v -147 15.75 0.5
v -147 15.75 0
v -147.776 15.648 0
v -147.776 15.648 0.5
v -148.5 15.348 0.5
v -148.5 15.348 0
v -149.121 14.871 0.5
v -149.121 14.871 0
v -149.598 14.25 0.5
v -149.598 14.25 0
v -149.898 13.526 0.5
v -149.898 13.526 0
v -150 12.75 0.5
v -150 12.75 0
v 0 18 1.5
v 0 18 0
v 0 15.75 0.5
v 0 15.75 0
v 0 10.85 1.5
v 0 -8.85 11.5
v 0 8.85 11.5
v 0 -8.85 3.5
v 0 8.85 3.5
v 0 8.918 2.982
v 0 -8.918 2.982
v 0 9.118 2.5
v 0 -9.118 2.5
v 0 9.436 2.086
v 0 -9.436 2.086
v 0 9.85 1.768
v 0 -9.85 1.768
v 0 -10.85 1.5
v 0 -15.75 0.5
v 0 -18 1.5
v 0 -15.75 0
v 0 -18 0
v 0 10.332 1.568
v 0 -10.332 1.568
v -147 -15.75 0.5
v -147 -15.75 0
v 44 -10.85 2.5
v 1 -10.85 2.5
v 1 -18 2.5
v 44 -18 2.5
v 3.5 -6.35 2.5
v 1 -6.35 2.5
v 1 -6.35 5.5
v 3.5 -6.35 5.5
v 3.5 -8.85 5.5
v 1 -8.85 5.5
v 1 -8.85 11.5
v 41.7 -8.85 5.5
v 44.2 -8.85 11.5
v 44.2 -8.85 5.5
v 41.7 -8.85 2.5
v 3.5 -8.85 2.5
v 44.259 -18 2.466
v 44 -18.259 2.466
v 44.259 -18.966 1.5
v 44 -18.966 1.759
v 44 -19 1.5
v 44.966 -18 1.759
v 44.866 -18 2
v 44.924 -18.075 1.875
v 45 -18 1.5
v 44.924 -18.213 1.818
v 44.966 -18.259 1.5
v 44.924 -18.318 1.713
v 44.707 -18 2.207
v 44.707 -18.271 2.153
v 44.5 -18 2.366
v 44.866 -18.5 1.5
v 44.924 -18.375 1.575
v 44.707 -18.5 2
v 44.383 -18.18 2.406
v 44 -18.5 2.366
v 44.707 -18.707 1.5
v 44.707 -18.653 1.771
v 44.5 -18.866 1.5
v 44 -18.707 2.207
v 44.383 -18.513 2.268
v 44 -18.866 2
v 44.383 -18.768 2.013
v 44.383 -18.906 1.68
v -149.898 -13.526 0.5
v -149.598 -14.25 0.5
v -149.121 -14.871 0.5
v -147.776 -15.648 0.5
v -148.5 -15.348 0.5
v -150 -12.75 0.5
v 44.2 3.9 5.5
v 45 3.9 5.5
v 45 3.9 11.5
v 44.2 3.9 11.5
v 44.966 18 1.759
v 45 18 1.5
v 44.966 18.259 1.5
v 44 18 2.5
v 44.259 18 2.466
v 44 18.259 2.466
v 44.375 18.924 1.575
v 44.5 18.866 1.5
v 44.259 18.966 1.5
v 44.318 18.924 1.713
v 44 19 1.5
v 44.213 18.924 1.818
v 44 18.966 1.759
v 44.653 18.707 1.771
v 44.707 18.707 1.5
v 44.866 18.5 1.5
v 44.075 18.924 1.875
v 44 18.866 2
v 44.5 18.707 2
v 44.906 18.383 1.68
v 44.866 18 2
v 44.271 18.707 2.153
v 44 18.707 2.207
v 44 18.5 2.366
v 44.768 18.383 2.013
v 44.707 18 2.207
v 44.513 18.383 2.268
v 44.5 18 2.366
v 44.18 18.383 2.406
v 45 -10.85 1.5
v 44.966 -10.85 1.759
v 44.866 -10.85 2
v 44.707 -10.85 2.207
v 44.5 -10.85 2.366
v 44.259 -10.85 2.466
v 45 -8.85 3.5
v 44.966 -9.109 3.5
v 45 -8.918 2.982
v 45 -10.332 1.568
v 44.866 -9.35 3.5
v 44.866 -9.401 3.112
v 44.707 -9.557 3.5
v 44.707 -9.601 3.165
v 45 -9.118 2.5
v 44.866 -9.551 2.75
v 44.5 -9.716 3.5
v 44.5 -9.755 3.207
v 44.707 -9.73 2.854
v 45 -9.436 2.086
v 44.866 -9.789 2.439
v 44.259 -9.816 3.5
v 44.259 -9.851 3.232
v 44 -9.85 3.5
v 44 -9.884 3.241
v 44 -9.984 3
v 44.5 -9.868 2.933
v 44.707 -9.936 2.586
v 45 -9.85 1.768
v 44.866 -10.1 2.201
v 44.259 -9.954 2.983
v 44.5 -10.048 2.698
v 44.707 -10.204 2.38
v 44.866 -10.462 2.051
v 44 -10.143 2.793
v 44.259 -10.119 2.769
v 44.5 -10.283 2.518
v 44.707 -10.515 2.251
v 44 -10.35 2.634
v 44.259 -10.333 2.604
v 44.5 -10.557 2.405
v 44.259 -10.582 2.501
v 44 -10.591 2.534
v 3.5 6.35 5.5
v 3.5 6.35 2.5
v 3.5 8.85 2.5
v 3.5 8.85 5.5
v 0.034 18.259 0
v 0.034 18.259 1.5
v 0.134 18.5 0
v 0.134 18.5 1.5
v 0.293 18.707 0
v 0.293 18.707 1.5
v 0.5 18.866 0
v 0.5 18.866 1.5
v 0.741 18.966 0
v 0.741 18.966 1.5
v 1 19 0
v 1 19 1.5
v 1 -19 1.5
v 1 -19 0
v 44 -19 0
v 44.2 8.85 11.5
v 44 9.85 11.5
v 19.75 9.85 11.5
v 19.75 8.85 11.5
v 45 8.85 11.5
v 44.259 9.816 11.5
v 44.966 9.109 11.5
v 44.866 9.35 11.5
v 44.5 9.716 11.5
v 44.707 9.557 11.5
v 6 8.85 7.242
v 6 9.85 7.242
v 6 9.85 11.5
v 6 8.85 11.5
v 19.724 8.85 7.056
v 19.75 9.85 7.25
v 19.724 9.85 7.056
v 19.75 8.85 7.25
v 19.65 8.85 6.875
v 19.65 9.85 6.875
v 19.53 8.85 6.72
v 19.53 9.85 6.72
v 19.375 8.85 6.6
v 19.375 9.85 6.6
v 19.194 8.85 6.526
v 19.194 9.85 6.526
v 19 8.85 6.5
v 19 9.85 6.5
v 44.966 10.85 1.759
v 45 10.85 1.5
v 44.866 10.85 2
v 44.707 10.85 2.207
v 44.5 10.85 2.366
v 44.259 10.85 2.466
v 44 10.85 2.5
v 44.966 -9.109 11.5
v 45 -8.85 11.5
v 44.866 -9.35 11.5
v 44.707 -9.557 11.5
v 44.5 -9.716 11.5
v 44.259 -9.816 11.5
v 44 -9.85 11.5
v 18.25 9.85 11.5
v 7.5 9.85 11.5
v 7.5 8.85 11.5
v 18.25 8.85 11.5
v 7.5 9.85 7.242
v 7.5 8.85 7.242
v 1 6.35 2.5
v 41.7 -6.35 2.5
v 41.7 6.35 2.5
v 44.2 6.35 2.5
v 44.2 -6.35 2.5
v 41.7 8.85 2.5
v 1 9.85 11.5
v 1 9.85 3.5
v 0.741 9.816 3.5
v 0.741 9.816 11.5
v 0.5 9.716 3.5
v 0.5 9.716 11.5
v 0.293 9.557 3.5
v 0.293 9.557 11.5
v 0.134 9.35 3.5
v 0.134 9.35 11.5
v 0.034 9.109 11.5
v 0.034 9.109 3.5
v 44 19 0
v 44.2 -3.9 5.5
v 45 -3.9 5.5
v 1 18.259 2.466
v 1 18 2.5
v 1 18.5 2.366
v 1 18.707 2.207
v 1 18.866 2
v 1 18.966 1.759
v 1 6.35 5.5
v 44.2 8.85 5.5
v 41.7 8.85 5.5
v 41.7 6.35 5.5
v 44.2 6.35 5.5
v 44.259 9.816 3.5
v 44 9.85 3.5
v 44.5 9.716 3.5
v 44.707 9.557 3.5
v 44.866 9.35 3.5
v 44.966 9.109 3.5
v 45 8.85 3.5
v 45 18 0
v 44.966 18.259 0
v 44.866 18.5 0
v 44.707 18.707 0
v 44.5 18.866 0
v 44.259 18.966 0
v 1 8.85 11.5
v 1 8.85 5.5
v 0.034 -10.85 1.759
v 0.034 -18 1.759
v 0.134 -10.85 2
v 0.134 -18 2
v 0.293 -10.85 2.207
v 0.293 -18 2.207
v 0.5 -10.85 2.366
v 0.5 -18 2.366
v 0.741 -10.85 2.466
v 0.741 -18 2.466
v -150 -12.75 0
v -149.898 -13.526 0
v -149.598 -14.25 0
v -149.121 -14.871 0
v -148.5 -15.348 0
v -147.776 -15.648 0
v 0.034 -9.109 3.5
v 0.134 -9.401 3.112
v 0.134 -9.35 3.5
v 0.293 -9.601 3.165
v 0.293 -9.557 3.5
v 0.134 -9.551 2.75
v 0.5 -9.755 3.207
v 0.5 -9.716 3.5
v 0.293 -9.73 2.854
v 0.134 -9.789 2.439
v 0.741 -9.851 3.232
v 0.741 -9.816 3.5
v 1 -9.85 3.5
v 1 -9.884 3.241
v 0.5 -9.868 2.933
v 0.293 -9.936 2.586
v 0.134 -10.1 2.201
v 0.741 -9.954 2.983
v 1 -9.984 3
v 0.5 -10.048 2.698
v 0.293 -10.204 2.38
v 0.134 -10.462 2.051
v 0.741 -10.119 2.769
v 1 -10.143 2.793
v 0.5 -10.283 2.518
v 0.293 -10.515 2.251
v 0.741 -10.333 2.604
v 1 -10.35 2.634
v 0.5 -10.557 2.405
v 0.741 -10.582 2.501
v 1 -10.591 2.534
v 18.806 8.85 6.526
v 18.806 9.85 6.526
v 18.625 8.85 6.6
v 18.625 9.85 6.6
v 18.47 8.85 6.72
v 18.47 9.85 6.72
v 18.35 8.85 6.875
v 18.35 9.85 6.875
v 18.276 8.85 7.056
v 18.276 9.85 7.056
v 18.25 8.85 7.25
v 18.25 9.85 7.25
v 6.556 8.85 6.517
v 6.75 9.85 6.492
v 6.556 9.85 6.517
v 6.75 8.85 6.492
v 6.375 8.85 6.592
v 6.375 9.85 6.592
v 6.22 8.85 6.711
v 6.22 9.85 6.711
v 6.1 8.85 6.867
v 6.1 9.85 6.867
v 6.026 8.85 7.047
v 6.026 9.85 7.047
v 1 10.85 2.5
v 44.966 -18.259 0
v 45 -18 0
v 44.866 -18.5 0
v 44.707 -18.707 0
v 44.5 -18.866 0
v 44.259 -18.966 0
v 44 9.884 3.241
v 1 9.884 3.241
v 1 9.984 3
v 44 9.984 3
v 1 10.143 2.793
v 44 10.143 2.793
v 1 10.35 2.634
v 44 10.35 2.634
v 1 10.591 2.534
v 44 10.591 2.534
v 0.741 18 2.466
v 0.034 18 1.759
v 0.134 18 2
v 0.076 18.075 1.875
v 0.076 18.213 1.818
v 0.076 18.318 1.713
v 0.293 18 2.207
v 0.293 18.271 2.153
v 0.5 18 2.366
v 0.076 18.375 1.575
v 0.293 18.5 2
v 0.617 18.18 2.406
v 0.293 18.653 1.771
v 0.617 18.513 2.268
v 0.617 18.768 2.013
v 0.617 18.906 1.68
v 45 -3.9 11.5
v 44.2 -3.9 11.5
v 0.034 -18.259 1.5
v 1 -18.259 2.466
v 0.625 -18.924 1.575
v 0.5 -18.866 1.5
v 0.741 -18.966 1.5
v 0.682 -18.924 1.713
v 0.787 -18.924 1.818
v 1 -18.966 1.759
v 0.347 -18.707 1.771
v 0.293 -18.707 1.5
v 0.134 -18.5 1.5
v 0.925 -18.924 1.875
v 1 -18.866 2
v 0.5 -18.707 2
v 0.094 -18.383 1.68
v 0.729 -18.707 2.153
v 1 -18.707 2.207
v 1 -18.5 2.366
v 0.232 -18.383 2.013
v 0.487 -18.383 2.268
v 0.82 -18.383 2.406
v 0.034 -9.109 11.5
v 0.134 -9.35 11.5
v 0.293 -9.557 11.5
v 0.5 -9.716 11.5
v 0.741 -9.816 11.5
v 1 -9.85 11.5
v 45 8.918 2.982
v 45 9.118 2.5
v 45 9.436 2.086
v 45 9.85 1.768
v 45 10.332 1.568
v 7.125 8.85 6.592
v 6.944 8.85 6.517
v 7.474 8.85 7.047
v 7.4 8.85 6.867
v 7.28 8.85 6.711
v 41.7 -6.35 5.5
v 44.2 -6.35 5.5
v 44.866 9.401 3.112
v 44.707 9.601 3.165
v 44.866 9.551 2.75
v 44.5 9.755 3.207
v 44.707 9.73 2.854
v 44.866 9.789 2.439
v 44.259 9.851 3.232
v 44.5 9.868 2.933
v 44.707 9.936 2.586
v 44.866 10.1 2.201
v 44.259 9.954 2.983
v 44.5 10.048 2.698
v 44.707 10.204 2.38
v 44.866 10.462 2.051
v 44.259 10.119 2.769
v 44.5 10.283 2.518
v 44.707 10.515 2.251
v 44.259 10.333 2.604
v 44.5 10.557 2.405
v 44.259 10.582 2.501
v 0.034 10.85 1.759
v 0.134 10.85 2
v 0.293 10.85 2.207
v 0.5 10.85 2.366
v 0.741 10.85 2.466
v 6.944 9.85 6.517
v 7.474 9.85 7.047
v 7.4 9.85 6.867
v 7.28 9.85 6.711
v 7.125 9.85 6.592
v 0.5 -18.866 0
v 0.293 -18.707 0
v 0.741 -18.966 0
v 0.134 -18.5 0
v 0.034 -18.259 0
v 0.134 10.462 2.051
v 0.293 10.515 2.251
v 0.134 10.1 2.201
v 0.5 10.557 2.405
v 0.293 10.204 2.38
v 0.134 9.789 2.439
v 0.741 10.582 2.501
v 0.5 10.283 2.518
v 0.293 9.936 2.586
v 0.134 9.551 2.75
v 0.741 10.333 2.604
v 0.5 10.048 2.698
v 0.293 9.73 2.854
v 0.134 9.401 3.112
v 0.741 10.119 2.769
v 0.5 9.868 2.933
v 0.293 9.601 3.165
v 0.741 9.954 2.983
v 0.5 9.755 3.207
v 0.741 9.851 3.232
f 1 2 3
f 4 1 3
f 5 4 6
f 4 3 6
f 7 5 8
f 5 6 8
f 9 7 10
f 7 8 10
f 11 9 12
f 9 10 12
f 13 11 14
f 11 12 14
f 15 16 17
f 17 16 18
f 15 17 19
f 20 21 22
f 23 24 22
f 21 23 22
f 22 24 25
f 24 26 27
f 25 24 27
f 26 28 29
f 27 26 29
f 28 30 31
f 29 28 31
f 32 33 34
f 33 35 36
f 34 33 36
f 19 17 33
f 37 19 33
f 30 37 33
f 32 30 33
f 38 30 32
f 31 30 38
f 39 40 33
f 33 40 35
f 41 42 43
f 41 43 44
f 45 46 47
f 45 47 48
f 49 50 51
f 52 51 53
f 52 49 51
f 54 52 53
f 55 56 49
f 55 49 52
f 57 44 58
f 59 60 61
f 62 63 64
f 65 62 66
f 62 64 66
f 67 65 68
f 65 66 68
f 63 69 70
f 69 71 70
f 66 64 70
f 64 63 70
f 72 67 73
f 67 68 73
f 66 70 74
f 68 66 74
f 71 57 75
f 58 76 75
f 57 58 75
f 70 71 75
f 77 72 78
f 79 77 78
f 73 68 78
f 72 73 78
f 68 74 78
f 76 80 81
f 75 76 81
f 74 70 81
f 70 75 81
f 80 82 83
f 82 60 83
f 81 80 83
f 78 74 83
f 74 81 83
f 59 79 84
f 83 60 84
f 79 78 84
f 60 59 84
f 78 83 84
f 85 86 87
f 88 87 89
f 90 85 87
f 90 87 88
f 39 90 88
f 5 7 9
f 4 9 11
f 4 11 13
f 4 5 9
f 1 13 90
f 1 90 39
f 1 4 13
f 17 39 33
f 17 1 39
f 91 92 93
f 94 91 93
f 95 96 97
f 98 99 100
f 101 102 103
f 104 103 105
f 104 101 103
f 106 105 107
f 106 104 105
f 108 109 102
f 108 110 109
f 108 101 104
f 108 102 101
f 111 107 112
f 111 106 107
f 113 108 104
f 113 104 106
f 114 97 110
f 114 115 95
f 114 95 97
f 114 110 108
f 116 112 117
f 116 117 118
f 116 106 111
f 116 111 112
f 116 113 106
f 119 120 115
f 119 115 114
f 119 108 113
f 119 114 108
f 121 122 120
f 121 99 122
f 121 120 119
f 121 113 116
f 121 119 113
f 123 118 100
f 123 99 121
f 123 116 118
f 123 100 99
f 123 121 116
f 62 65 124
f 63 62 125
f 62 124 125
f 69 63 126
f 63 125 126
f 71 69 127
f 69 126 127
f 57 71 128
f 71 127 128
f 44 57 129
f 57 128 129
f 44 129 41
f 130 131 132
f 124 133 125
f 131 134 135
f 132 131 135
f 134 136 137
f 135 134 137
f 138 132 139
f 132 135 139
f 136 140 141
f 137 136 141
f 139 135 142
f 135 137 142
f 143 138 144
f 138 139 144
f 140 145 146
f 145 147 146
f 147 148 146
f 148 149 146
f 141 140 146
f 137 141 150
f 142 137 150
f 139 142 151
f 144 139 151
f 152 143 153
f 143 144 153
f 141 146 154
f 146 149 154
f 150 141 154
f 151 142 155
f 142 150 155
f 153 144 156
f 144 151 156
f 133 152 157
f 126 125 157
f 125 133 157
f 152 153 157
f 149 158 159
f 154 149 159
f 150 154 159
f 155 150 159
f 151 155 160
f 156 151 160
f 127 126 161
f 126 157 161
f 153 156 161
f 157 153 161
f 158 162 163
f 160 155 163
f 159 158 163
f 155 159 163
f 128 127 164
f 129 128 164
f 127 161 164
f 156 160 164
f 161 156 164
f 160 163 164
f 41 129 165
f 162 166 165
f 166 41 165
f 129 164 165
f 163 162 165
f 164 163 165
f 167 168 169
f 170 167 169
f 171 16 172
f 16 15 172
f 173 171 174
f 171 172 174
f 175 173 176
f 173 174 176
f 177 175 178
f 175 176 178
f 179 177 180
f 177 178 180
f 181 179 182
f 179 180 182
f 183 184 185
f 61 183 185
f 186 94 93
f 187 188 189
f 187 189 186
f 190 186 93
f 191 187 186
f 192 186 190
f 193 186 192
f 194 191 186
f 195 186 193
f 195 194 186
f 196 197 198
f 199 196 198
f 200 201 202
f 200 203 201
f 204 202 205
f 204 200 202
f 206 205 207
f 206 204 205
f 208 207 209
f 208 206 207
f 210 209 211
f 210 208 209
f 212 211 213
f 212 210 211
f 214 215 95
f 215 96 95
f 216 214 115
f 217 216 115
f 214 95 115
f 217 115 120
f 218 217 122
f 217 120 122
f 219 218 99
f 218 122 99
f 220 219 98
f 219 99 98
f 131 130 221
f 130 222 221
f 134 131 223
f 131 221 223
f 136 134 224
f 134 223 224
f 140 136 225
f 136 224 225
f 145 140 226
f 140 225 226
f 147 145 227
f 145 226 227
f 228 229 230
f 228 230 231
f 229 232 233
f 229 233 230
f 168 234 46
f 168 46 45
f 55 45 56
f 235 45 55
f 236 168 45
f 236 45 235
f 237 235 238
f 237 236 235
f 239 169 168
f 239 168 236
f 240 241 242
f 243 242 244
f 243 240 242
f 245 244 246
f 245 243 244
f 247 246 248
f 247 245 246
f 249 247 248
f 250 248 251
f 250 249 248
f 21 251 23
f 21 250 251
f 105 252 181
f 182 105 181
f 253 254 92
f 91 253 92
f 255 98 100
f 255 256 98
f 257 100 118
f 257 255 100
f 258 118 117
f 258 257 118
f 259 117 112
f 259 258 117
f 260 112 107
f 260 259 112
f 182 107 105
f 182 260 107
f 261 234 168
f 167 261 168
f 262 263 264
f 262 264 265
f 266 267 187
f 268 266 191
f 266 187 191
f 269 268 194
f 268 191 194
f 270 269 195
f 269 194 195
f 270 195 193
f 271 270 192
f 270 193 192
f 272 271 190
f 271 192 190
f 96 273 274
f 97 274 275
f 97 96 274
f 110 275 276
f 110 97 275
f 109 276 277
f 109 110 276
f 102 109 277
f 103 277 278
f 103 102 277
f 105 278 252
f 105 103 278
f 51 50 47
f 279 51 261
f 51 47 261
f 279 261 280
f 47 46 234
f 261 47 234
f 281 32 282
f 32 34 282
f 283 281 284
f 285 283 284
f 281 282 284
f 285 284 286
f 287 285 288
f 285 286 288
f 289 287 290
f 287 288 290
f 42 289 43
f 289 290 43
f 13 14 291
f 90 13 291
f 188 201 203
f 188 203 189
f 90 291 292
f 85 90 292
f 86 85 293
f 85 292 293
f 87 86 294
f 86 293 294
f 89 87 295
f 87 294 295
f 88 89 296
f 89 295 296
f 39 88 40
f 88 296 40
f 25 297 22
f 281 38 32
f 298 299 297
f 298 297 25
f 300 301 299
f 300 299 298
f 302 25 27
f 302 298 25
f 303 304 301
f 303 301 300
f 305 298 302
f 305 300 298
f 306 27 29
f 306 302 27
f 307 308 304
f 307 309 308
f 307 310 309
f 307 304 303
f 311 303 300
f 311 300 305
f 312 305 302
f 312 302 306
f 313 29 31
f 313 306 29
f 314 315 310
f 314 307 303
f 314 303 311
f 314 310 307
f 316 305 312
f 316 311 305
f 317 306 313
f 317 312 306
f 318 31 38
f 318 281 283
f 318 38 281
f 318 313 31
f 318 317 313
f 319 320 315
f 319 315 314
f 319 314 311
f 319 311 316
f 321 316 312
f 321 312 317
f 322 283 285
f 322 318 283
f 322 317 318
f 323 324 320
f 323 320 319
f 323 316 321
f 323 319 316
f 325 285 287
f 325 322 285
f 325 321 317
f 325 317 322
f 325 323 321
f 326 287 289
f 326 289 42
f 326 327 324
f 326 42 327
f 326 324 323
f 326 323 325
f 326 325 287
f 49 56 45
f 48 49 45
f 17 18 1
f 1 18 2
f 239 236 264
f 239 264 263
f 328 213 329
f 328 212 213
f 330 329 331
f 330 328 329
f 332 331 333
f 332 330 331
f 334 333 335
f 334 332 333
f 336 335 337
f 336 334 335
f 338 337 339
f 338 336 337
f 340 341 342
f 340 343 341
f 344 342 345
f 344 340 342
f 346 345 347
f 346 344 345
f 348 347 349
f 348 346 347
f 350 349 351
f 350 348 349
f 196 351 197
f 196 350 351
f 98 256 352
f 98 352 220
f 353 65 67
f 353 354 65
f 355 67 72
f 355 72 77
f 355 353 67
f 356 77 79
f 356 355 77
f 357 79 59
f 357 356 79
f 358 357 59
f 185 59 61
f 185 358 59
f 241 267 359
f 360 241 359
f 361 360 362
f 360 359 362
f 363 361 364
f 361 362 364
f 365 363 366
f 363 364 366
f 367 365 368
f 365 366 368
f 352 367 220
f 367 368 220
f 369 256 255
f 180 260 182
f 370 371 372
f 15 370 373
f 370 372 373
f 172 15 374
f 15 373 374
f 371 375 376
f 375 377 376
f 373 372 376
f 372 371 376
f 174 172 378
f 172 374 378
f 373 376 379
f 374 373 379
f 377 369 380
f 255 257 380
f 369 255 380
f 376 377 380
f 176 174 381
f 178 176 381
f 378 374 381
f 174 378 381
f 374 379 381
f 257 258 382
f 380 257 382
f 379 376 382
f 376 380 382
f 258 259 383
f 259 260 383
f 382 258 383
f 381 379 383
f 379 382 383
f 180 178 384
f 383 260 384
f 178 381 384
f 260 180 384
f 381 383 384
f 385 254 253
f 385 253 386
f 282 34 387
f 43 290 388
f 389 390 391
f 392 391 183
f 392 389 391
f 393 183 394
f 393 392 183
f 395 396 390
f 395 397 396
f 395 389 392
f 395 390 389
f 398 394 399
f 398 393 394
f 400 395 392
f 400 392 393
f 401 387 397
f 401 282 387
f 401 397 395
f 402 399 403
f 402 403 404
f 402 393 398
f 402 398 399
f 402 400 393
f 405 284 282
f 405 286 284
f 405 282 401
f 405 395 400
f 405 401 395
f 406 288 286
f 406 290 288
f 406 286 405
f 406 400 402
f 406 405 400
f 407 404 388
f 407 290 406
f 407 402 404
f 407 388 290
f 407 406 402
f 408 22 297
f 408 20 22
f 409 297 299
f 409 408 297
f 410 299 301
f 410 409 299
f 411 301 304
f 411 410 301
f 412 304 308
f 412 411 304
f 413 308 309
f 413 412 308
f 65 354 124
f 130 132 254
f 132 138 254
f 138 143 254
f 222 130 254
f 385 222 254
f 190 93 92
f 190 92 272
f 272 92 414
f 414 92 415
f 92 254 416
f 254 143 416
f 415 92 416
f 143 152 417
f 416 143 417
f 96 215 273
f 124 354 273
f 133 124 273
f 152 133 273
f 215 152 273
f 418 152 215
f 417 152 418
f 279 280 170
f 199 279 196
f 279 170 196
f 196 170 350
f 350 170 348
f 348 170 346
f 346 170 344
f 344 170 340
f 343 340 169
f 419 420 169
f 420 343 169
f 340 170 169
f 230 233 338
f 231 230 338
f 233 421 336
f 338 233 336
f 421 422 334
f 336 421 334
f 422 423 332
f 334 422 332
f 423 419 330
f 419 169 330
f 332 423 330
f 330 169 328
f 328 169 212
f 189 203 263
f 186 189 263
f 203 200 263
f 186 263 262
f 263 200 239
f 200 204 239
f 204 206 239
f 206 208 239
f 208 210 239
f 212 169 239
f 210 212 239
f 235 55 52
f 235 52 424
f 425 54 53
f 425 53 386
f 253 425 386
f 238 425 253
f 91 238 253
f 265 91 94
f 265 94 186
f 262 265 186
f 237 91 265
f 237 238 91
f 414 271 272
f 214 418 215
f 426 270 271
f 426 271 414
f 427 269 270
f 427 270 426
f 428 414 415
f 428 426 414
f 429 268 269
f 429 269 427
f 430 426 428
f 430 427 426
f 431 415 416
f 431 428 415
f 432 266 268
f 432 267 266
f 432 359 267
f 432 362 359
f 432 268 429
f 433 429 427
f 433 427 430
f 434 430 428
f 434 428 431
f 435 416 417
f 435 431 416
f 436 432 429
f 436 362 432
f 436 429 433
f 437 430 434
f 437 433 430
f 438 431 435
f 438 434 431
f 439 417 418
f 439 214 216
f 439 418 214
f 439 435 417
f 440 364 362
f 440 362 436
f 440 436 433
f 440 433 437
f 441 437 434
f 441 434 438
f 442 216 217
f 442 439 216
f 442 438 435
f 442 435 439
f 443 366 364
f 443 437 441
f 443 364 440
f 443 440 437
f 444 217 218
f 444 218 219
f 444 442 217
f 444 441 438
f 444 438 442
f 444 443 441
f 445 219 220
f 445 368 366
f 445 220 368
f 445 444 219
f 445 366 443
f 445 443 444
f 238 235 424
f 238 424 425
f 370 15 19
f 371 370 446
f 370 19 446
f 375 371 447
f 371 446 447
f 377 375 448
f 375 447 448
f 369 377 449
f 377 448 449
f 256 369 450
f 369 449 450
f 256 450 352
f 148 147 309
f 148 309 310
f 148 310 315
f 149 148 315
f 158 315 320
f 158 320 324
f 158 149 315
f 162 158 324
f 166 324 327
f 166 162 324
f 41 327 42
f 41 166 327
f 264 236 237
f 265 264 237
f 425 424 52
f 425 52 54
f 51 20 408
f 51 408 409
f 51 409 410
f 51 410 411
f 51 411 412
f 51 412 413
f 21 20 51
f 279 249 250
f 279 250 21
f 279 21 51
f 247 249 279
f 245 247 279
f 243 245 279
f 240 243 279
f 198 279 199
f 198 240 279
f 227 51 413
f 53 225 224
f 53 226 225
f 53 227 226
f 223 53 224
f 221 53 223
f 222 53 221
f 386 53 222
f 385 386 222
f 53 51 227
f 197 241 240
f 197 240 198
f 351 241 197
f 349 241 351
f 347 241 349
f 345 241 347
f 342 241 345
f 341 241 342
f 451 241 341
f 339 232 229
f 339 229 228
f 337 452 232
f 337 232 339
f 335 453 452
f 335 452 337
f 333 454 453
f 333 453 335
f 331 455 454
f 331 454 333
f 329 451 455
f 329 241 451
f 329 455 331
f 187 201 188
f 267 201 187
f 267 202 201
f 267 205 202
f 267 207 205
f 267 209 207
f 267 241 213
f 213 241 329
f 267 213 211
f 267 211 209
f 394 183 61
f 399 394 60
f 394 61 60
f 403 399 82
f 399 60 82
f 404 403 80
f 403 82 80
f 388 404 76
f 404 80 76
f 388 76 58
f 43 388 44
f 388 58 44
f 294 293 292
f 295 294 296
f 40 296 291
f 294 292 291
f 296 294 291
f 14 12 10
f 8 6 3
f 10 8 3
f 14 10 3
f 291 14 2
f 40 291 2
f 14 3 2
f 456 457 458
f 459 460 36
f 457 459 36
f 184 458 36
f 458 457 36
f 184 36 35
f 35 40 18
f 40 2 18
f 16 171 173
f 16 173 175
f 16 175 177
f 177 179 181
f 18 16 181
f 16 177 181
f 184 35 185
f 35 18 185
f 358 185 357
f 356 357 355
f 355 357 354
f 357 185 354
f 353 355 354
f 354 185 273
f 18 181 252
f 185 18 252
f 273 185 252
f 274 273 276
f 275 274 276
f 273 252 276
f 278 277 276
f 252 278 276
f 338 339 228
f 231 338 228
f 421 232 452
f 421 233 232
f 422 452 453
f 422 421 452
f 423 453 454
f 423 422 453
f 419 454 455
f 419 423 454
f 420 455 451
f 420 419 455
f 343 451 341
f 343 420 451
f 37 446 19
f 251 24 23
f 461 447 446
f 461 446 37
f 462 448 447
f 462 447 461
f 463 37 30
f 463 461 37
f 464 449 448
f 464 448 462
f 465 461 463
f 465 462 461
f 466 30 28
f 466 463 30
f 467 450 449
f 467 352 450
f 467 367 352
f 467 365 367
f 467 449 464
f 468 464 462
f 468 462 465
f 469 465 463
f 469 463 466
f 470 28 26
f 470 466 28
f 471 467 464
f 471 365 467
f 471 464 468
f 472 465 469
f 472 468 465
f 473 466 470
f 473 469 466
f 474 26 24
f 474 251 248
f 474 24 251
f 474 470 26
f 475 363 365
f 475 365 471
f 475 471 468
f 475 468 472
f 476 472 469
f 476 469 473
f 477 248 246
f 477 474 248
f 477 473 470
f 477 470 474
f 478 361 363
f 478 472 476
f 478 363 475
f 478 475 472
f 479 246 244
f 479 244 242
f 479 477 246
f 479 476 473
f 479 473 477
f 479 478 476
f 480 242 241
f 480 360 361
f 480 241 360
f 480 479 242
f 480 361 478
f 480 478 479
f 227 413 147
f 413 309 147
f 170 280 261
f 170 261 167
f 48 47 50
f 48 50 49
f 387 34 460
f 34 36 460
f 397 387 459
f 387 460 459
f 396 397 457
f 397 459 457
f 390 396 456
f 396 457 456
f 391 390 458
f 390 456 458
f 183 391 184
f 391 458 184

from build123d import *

# Parameters (mm, degrees)
F1_DEPTH  = 0.5
F3_DEPTH  = 2
F4_W      = 45
F4_H      = 19.7
F4_W_2    = 43.2
F4_H_2    = 17.7
F5_DEPTH  = 9
F6_W      = 2.5
F6_H      = 2.5
F7_DEPTH  = 3
F8_W      = 7.8
F8_H      = 6
F9_DEPTH  = 0.8
F10_W     = 1.5
F10_H     = 5
F10_H_2   = 5.0084371828
F11_DEPTH = 1
F12_R     = 0.74999
F13_R     = 1


# Not quite as in the source:
# - a fillet or chamfer is up to 0.001 mm smaller than in the source, because OpenCascade refuses the exact size


with BuildPart() as f1:
    # F0 (on Top) → F1 (new body)
    with BuildSketch(Plane.XY):
        with BuildLine():
            Line((0, -15.75), (0, 15.75))
            Line((0, 15.75), (-147, 15.75))
            ThreePointArc((-147, 15.75), (-149.1213203436, 14.8713203436), (-150, 12.75))
            Line((-150, 12.75), (-150, -12.75))
            ThreePointArc((-150, -12.75), (-149.1213203436, -14.8713203436), (-147, -15.75))
            Line((-147, -15.75), (0, -15.75))
        make_face()
        Polygon((45, 19), (0, 19), (0, 15.75), (0, -15.75), (0, -19), (45, -19), align=None)
    extrude(amount=F1_DEPTH)

    # F2 (on face) → F3 (join)
    with BuildSketch(Plane.XY.offset(0.5)):
        Polygon((45, -19), (45, 19), (0, 19), (0, 15.75), (0, -15.75), (0, -19), align=None)
    extrude(amount=F3_DEPTH)

    # F4 (on face) → F5 (join)
    with BuildSketch(Plane.XY.offset(2.5)):
        with Locations((22.5, 0)):
            Rectangle(F4_W, F4_H)
        with Locations((22.6, 0)):
            Rectangle(F4_W_2, F4_H_2, mode=Mode.SUBTRACT)
    extrude(amount=F5_DEPTH)

    # F6 (on face) → F7 (join)
    with BuildSketch(Plane.XY.offset(2.5)):
        with Locations((2.25, 7.6)):
            Rectangle(F6_W, F6_H)
        with Locations((42.95, 7.6)):
            Rectangle(F6_W, F6_H)
        with Locations((42.95, -7.6)):
            Rectangle(F6_W, F6_H)
        with Locations((2.25, -7.6)):
            Rectangle(F6_W, F6_H)
    extrude(amount=F7_DEPTH)

    # F8 (on face) → F9 (cut, through all)
    with BuildSketch(Plane.YZ.offset(45)):
        with Locations((0, 8.5)):
            Rectangle(F8_W, F8_H)
    extrude(amount=-F9_DEPTH, mode=Mode.SUBTRACT)

    # F10 (on face) → F11 (cut, through all)
    with BuildSketch(Plane(origin=(0, 9.85, 0), x_dir=(-1, 0, 0), z_dir=(0, 1, 0))):
        with Locations((-19, 9)):
            Rectangle(F10_W, F10_H)
        with Locations((-6.75, 8.9957814086)):
            Rectangle(F10_W, F10_H_2)
    extrude(amount=-F11_DEPTH, mode=Mode.SUBTRACT)

    # F12 (radius 0.75 in the source; OpenCascade refuses exactly that, so slightly less here)
    f12_edges = [f1.edges().sort_by_distance(p)[0] for p in [
        (18.25, 9.35, 6.5),
        (19.75, 9.35, 6.5),
        (6, 9.35, 6.491563),
        (7.5, 9.35, 6.491563),
    ]]
    fillet(f12_edges, radius=F12_R)

    # F13
    f13_edges = [f1.edges().sort_by_distance(p)[0] for p in [
        (45, 9.85, 7),
        (45, 14.425, 2.5),
        (45, 19, 1.25),
        (22.5, 19, 2.5),
        (0, 14.425, 2.5),
        (0, 9.85, 7),
        (22.5, 9.85, 2.5),
        (0, -9.85, 7),
        (0, -14.425, 2.5),
        (0, -19, 1.25),
        (22.5, -19, 2.5),
        (22.5, -9.85, 2.5),
        (45, -9.85, 7),
        (45, -14.425, 2.5),
        (45, -19, 1.25),
        (0, 19, 1.25),
    ]]
    fillet(f13_edges, radius=F13_R)


solid = f1.part
